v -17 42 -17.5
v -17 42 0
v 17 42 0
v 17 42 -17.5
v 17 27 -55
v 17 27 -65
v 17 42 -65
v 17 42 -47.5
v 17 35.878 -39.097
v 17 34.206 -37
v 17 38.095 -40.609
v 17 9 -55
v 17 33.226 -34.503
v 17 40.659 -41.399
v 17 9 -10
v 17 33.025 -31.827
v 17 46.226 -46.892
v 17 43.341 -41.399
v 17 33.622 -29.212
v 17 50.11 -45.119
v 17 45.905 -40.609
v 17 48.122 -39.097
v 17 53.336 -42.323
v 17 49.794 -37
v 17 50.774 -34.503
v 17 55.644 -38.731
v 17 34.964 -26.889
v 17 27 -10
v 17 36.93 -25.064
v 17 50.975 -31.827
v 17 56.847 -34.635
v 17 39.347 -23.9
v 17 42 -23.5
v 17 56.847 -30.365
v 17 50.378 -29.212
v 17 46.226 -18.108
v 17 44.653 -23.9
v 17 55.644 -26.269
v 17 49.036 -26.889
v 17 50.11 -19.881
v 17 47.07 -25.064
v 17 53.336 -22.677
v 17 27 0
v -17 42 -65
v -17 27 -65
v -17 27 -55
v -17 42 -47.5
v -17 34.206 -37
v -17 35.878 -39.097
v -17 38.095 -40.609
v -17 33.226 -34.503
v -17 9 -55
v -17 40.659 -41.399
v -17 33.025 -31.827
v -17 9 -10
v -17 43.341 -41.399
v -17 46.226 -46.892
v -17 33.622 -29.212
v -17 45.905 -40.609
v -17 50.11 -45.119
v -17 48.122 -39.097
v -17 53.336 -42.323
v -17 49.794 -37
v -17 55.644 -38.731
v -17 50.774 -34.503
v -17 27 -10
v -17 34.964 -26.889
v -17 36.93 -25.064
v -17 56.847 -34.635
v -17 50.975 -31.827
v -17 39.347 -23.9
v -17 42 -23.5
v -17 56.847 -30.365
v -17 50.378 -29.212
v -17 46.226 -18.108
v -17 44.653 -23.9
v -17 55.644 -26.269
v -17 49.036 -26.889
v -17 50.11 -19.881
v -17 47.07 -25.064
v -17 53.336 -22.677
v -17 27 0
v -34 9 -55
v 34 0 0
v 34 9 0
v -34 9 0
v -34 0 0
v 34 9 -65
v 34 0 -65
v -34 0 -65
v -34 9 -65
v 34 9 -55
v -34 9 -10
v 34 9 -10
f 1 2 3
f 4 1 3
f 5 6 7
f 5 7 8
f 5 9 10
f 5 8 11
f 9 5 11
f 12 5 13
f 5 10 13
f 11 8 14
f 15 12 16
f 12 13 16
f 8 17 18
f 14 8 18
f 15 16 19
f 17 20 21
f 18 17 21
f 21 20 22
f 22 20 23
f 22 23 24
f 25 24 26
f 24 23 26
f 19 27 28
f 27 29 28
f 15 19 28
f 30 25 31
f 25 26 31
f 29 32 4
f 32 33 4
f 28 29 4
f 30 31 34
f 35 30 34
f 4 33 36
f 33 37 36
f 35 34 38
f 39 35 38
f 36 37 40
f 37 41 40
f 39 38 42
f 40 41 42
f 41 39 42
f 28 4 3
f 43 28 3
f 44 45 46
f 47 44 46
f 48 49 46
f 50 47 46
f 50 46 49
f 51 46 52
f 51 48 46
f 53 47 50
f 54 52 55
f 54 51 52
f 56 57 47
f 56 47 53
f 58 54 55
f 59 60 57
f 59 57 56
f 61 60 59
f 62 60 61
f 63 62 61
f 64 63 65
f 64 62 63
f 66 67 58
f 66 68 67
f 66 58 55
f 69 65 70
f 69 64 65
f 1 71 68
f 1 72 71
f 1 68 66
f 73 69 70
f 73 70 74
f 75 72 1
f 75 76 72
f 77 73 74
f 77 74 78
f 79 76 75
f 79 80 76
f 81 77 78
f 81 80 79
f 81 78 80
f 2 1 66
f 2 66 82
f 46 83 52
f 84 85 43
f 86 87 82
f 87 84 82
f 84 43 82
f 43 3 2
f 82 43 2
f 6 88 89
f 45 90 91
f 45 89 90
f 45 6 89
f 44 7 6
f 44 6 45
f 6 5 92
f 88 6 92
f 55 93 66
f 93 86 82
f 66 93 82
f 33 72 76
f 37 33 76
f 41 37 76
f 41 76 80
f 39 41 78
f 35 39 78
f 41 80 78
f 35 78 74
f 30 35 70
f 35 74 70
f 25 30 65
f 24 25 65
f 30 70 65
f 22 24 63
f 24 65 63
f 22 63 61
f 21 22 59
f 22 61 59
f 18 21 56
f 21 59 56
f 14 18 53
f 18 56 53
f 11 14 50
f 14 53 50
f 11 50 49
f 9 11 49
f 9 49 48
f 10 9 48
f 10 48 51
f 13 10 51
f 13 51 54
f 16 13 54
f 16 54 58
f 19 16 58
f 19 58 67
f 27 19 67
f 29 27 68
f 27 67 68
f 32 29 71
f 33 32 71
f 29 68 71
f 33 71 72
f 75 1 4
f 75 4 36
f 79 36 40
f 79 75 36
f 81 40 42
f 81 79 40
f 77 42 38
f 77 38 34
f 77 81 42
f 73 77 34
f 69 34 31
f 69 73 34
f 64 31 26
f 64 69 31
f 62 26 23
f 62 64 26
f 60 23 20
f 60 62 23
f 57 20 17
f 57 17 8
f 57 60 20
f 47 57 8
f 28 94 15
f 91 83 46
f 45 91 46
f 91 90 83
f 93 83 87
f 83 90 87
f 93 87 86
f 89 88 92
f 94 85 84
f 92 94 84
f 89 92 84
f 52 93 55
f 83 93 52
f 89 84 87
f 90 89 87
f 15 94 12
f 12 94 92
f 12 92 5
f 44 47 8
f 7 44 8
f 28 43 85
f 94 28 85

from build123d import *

# Parameters (mm, degrees)
BOSS_EXTRUDE1_DEPTH = 65
SKETCH2_R           = 15
BOSS_EXTRUDE2_DEPTH = 34
SKETCH3_R           = 9
CUT_EXTRUDE1_DEPTH  = 34
SKETCH4_W           = 45
SKETCH4_H           = 18
CUT_EXTRUDE2_DEPTH  = 17


with BuildPart() as part:
    # Sketch1 → Boss-Extrude1 (new body)
    with BuildSketch(Plane.XY):
        Polygon((-34, 0), (-34, 9), (-17, 27), (-17, 42), (17, 42), (17, 27), (34, 9), (34, 0), align=None)
    extrude(amount=-BOSS_EXTRUDE1_DEPTH)

    # Sketch2 → Boss-Extrude2 (add)
    with BuildSketch(Plane.ZY.offset(17)):
        with Locations((-32.5, 42)):
            Circle(SKETCH2_R)
    extrude(amount=-BOSS_EXTRUDE2_DEPTH)

    # Sketch3 → Cut-Extrude1 (cut)
    with BuildSketch(Plane.ZY.offset(17)):
        with Locations((-32.5, 42)):
            Circle(SKETCH3_R)
    extrude(amount=-CUT_EXTRUDE1_DEPTH, mode=Mode.SUBTRACT)

    # Sketch4 → Cut-Extrude2 (cut)
    with BuildSketch(Plane(origin=(-34, 0, 0), x_dir=(0, 0, -1), z_dir=(1, 0, 0))):
        with Locations((32.5, 18)):
            Rectangle(SKETCH4_W, SKETCH4_H)
    cut_extrude2 = extrude(amount=CUT_EXTRUDE2_DEPTH, mode=Mode.SUBTRACT)

    # Mirror1: Cut-Extrude2 across plane
    add(cut_extrude2.mirror(Plane(origin=(0, 0, 0), x_dir=(0, 0, 1), z_dir=(1, 0, 0))), mode=Mode.SUBTRACT)


solid = part.part
